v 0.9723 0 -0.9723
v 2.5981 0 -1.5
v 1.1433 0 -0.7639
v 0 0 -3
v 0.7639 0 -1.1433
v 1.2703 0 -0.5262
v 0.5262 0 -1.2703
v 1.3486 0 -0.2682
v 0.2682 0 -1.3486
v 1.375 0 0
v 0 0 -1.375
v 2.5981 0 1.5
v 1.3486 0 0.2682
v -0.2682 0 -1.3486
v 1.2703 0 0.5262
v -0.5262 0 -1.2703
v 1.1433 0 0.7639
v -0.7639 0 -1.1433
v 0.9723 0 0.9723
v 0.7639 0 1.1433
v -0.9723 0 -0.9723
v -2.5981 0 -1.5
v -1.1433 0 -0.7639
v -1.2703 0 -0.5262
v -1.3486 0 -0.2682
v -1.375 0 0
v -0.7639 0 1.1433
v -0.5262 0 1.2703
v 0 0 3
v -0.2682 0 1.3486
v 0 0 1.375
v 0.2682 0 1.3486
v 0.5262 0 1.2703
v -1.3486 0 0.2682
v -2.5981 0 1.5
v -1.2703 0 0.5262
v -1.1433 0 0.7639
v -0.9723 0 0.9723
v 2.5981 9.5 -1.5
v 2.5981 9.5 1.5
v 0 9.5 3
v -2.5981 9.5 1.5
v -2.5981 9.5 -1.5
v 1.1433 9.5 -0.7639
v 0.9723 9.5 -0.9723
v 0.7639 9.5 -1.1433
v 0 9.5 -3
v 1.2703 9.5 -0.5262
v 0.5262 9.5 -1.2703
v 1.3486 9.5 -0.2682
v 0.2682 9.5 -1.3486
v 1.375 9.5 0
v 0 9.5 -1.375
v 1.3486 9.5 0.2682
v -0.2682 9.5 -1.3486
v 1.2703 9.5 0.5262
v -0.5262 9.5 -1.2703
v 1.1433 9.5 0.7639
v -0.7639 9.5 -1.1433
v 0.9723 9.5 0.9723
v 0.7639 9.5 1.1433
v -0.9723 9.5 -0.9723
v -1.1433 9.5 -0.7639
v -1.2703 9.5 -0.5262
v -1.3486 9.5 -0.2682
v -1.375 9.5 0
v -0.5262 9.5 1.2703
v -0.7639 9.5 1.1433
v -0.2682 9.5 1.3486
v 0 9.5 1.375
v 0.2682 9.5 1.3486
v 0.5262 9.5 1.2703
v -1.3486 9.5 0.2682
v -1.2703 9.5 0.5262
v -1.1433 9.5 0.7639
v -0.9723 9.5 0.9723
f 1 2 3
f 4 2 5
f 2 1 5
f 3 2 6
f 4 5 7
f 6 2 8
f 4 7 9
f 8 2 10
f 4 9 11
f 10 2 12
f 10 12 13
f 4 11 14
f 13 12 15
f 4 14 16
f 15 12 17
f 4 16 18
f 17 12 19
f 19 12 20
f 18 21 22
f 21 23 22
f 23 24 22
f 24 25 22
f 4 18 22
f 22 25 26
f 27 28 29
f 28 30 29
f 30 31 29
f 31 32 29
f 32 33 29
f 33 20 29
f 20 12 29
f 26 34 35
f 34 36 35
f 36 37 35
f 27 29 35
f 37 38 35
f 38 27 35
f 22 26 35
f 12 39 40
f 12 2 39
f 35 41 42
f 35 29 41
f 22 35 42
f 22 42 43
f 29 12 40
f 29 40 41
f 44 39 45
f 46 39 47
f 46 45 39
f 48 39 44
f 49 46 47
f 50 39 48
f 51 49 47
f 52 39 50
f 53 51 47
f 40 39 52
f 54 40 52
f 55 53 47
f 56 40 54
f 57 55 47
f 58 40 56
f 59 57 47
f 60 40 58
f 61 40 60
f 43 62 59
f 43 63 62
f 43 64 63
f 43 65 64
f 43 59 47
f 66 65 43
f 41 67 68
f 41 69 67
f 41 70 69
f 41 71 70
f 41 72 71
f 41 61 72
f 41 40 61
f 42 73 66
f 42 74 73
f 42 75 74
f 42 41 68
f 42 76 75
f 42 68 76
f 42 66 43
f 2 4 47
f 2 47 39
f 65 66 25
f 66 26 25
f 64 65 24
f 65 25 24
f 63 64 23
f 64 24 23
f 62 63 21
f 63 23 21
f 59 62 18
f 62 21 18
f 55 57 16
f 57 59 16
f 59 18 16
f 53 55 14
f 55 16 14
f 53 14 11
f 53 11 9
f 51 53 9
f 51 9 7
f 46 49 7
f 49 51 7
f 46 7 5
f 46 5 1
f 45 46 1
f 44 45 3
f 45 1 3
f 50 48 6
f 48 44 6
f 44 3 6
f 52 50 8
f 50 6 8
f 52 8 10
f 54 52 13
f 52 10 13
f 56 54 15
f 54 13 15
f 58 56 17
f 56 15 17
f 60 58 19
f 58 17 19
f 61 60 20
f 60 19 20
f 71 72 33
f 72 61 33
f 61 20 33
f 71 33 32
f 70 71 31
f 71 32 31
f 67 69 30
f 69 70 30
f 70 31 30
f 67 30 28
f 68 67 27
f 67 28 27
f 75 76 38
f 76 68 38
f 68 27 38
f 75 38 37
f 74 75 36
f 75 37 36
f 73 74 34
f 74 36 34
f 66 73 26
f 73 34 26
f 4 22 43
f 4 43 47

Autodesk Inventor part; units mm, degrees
ref_plane "YZ Plane" through (0, 0, 0) normal (1, 0, 0) x (0, 1, 0)
ref_plane "XZ Plane" through (0, 0, 0) normal (0, 1, 0) x (-1, 0, 0)
ref_plane "XY Plane" through (0, 0, 0) normal (0, 0, 1) x (1, 0, 0)
sketch "Boceto1" plane through (0, 0, 0) normal (0, 1, 0) x (-1, 0, 0)
  circle A0 centre (0, 0) radius 1.375
  circle A1 centre (0, 0) radius 3
  line L0 (0, -3) -> (-2.5981, -1.5)
  line L1 (-2.5981, -1.5) -> (-2.5981, 1.5)
  line L2 (-2.5981, 1.5) -> (0, 3)
  line L3 (0, 3) -> (2.5981, 1.5)
  line L4 (2.5981, 1.5) -> (2.5981, -1.5)
  line L5 (2.5981, -1.5) -> (0, -3)
  dimension "d1" = 6
  dimension "d0" = 2.75
extrude "Extrusión1" add sketch "Boceto1" along normal blind 9.5 contours L4 L5 L0 L1 L2 L3
properties part number "Espaciador"
